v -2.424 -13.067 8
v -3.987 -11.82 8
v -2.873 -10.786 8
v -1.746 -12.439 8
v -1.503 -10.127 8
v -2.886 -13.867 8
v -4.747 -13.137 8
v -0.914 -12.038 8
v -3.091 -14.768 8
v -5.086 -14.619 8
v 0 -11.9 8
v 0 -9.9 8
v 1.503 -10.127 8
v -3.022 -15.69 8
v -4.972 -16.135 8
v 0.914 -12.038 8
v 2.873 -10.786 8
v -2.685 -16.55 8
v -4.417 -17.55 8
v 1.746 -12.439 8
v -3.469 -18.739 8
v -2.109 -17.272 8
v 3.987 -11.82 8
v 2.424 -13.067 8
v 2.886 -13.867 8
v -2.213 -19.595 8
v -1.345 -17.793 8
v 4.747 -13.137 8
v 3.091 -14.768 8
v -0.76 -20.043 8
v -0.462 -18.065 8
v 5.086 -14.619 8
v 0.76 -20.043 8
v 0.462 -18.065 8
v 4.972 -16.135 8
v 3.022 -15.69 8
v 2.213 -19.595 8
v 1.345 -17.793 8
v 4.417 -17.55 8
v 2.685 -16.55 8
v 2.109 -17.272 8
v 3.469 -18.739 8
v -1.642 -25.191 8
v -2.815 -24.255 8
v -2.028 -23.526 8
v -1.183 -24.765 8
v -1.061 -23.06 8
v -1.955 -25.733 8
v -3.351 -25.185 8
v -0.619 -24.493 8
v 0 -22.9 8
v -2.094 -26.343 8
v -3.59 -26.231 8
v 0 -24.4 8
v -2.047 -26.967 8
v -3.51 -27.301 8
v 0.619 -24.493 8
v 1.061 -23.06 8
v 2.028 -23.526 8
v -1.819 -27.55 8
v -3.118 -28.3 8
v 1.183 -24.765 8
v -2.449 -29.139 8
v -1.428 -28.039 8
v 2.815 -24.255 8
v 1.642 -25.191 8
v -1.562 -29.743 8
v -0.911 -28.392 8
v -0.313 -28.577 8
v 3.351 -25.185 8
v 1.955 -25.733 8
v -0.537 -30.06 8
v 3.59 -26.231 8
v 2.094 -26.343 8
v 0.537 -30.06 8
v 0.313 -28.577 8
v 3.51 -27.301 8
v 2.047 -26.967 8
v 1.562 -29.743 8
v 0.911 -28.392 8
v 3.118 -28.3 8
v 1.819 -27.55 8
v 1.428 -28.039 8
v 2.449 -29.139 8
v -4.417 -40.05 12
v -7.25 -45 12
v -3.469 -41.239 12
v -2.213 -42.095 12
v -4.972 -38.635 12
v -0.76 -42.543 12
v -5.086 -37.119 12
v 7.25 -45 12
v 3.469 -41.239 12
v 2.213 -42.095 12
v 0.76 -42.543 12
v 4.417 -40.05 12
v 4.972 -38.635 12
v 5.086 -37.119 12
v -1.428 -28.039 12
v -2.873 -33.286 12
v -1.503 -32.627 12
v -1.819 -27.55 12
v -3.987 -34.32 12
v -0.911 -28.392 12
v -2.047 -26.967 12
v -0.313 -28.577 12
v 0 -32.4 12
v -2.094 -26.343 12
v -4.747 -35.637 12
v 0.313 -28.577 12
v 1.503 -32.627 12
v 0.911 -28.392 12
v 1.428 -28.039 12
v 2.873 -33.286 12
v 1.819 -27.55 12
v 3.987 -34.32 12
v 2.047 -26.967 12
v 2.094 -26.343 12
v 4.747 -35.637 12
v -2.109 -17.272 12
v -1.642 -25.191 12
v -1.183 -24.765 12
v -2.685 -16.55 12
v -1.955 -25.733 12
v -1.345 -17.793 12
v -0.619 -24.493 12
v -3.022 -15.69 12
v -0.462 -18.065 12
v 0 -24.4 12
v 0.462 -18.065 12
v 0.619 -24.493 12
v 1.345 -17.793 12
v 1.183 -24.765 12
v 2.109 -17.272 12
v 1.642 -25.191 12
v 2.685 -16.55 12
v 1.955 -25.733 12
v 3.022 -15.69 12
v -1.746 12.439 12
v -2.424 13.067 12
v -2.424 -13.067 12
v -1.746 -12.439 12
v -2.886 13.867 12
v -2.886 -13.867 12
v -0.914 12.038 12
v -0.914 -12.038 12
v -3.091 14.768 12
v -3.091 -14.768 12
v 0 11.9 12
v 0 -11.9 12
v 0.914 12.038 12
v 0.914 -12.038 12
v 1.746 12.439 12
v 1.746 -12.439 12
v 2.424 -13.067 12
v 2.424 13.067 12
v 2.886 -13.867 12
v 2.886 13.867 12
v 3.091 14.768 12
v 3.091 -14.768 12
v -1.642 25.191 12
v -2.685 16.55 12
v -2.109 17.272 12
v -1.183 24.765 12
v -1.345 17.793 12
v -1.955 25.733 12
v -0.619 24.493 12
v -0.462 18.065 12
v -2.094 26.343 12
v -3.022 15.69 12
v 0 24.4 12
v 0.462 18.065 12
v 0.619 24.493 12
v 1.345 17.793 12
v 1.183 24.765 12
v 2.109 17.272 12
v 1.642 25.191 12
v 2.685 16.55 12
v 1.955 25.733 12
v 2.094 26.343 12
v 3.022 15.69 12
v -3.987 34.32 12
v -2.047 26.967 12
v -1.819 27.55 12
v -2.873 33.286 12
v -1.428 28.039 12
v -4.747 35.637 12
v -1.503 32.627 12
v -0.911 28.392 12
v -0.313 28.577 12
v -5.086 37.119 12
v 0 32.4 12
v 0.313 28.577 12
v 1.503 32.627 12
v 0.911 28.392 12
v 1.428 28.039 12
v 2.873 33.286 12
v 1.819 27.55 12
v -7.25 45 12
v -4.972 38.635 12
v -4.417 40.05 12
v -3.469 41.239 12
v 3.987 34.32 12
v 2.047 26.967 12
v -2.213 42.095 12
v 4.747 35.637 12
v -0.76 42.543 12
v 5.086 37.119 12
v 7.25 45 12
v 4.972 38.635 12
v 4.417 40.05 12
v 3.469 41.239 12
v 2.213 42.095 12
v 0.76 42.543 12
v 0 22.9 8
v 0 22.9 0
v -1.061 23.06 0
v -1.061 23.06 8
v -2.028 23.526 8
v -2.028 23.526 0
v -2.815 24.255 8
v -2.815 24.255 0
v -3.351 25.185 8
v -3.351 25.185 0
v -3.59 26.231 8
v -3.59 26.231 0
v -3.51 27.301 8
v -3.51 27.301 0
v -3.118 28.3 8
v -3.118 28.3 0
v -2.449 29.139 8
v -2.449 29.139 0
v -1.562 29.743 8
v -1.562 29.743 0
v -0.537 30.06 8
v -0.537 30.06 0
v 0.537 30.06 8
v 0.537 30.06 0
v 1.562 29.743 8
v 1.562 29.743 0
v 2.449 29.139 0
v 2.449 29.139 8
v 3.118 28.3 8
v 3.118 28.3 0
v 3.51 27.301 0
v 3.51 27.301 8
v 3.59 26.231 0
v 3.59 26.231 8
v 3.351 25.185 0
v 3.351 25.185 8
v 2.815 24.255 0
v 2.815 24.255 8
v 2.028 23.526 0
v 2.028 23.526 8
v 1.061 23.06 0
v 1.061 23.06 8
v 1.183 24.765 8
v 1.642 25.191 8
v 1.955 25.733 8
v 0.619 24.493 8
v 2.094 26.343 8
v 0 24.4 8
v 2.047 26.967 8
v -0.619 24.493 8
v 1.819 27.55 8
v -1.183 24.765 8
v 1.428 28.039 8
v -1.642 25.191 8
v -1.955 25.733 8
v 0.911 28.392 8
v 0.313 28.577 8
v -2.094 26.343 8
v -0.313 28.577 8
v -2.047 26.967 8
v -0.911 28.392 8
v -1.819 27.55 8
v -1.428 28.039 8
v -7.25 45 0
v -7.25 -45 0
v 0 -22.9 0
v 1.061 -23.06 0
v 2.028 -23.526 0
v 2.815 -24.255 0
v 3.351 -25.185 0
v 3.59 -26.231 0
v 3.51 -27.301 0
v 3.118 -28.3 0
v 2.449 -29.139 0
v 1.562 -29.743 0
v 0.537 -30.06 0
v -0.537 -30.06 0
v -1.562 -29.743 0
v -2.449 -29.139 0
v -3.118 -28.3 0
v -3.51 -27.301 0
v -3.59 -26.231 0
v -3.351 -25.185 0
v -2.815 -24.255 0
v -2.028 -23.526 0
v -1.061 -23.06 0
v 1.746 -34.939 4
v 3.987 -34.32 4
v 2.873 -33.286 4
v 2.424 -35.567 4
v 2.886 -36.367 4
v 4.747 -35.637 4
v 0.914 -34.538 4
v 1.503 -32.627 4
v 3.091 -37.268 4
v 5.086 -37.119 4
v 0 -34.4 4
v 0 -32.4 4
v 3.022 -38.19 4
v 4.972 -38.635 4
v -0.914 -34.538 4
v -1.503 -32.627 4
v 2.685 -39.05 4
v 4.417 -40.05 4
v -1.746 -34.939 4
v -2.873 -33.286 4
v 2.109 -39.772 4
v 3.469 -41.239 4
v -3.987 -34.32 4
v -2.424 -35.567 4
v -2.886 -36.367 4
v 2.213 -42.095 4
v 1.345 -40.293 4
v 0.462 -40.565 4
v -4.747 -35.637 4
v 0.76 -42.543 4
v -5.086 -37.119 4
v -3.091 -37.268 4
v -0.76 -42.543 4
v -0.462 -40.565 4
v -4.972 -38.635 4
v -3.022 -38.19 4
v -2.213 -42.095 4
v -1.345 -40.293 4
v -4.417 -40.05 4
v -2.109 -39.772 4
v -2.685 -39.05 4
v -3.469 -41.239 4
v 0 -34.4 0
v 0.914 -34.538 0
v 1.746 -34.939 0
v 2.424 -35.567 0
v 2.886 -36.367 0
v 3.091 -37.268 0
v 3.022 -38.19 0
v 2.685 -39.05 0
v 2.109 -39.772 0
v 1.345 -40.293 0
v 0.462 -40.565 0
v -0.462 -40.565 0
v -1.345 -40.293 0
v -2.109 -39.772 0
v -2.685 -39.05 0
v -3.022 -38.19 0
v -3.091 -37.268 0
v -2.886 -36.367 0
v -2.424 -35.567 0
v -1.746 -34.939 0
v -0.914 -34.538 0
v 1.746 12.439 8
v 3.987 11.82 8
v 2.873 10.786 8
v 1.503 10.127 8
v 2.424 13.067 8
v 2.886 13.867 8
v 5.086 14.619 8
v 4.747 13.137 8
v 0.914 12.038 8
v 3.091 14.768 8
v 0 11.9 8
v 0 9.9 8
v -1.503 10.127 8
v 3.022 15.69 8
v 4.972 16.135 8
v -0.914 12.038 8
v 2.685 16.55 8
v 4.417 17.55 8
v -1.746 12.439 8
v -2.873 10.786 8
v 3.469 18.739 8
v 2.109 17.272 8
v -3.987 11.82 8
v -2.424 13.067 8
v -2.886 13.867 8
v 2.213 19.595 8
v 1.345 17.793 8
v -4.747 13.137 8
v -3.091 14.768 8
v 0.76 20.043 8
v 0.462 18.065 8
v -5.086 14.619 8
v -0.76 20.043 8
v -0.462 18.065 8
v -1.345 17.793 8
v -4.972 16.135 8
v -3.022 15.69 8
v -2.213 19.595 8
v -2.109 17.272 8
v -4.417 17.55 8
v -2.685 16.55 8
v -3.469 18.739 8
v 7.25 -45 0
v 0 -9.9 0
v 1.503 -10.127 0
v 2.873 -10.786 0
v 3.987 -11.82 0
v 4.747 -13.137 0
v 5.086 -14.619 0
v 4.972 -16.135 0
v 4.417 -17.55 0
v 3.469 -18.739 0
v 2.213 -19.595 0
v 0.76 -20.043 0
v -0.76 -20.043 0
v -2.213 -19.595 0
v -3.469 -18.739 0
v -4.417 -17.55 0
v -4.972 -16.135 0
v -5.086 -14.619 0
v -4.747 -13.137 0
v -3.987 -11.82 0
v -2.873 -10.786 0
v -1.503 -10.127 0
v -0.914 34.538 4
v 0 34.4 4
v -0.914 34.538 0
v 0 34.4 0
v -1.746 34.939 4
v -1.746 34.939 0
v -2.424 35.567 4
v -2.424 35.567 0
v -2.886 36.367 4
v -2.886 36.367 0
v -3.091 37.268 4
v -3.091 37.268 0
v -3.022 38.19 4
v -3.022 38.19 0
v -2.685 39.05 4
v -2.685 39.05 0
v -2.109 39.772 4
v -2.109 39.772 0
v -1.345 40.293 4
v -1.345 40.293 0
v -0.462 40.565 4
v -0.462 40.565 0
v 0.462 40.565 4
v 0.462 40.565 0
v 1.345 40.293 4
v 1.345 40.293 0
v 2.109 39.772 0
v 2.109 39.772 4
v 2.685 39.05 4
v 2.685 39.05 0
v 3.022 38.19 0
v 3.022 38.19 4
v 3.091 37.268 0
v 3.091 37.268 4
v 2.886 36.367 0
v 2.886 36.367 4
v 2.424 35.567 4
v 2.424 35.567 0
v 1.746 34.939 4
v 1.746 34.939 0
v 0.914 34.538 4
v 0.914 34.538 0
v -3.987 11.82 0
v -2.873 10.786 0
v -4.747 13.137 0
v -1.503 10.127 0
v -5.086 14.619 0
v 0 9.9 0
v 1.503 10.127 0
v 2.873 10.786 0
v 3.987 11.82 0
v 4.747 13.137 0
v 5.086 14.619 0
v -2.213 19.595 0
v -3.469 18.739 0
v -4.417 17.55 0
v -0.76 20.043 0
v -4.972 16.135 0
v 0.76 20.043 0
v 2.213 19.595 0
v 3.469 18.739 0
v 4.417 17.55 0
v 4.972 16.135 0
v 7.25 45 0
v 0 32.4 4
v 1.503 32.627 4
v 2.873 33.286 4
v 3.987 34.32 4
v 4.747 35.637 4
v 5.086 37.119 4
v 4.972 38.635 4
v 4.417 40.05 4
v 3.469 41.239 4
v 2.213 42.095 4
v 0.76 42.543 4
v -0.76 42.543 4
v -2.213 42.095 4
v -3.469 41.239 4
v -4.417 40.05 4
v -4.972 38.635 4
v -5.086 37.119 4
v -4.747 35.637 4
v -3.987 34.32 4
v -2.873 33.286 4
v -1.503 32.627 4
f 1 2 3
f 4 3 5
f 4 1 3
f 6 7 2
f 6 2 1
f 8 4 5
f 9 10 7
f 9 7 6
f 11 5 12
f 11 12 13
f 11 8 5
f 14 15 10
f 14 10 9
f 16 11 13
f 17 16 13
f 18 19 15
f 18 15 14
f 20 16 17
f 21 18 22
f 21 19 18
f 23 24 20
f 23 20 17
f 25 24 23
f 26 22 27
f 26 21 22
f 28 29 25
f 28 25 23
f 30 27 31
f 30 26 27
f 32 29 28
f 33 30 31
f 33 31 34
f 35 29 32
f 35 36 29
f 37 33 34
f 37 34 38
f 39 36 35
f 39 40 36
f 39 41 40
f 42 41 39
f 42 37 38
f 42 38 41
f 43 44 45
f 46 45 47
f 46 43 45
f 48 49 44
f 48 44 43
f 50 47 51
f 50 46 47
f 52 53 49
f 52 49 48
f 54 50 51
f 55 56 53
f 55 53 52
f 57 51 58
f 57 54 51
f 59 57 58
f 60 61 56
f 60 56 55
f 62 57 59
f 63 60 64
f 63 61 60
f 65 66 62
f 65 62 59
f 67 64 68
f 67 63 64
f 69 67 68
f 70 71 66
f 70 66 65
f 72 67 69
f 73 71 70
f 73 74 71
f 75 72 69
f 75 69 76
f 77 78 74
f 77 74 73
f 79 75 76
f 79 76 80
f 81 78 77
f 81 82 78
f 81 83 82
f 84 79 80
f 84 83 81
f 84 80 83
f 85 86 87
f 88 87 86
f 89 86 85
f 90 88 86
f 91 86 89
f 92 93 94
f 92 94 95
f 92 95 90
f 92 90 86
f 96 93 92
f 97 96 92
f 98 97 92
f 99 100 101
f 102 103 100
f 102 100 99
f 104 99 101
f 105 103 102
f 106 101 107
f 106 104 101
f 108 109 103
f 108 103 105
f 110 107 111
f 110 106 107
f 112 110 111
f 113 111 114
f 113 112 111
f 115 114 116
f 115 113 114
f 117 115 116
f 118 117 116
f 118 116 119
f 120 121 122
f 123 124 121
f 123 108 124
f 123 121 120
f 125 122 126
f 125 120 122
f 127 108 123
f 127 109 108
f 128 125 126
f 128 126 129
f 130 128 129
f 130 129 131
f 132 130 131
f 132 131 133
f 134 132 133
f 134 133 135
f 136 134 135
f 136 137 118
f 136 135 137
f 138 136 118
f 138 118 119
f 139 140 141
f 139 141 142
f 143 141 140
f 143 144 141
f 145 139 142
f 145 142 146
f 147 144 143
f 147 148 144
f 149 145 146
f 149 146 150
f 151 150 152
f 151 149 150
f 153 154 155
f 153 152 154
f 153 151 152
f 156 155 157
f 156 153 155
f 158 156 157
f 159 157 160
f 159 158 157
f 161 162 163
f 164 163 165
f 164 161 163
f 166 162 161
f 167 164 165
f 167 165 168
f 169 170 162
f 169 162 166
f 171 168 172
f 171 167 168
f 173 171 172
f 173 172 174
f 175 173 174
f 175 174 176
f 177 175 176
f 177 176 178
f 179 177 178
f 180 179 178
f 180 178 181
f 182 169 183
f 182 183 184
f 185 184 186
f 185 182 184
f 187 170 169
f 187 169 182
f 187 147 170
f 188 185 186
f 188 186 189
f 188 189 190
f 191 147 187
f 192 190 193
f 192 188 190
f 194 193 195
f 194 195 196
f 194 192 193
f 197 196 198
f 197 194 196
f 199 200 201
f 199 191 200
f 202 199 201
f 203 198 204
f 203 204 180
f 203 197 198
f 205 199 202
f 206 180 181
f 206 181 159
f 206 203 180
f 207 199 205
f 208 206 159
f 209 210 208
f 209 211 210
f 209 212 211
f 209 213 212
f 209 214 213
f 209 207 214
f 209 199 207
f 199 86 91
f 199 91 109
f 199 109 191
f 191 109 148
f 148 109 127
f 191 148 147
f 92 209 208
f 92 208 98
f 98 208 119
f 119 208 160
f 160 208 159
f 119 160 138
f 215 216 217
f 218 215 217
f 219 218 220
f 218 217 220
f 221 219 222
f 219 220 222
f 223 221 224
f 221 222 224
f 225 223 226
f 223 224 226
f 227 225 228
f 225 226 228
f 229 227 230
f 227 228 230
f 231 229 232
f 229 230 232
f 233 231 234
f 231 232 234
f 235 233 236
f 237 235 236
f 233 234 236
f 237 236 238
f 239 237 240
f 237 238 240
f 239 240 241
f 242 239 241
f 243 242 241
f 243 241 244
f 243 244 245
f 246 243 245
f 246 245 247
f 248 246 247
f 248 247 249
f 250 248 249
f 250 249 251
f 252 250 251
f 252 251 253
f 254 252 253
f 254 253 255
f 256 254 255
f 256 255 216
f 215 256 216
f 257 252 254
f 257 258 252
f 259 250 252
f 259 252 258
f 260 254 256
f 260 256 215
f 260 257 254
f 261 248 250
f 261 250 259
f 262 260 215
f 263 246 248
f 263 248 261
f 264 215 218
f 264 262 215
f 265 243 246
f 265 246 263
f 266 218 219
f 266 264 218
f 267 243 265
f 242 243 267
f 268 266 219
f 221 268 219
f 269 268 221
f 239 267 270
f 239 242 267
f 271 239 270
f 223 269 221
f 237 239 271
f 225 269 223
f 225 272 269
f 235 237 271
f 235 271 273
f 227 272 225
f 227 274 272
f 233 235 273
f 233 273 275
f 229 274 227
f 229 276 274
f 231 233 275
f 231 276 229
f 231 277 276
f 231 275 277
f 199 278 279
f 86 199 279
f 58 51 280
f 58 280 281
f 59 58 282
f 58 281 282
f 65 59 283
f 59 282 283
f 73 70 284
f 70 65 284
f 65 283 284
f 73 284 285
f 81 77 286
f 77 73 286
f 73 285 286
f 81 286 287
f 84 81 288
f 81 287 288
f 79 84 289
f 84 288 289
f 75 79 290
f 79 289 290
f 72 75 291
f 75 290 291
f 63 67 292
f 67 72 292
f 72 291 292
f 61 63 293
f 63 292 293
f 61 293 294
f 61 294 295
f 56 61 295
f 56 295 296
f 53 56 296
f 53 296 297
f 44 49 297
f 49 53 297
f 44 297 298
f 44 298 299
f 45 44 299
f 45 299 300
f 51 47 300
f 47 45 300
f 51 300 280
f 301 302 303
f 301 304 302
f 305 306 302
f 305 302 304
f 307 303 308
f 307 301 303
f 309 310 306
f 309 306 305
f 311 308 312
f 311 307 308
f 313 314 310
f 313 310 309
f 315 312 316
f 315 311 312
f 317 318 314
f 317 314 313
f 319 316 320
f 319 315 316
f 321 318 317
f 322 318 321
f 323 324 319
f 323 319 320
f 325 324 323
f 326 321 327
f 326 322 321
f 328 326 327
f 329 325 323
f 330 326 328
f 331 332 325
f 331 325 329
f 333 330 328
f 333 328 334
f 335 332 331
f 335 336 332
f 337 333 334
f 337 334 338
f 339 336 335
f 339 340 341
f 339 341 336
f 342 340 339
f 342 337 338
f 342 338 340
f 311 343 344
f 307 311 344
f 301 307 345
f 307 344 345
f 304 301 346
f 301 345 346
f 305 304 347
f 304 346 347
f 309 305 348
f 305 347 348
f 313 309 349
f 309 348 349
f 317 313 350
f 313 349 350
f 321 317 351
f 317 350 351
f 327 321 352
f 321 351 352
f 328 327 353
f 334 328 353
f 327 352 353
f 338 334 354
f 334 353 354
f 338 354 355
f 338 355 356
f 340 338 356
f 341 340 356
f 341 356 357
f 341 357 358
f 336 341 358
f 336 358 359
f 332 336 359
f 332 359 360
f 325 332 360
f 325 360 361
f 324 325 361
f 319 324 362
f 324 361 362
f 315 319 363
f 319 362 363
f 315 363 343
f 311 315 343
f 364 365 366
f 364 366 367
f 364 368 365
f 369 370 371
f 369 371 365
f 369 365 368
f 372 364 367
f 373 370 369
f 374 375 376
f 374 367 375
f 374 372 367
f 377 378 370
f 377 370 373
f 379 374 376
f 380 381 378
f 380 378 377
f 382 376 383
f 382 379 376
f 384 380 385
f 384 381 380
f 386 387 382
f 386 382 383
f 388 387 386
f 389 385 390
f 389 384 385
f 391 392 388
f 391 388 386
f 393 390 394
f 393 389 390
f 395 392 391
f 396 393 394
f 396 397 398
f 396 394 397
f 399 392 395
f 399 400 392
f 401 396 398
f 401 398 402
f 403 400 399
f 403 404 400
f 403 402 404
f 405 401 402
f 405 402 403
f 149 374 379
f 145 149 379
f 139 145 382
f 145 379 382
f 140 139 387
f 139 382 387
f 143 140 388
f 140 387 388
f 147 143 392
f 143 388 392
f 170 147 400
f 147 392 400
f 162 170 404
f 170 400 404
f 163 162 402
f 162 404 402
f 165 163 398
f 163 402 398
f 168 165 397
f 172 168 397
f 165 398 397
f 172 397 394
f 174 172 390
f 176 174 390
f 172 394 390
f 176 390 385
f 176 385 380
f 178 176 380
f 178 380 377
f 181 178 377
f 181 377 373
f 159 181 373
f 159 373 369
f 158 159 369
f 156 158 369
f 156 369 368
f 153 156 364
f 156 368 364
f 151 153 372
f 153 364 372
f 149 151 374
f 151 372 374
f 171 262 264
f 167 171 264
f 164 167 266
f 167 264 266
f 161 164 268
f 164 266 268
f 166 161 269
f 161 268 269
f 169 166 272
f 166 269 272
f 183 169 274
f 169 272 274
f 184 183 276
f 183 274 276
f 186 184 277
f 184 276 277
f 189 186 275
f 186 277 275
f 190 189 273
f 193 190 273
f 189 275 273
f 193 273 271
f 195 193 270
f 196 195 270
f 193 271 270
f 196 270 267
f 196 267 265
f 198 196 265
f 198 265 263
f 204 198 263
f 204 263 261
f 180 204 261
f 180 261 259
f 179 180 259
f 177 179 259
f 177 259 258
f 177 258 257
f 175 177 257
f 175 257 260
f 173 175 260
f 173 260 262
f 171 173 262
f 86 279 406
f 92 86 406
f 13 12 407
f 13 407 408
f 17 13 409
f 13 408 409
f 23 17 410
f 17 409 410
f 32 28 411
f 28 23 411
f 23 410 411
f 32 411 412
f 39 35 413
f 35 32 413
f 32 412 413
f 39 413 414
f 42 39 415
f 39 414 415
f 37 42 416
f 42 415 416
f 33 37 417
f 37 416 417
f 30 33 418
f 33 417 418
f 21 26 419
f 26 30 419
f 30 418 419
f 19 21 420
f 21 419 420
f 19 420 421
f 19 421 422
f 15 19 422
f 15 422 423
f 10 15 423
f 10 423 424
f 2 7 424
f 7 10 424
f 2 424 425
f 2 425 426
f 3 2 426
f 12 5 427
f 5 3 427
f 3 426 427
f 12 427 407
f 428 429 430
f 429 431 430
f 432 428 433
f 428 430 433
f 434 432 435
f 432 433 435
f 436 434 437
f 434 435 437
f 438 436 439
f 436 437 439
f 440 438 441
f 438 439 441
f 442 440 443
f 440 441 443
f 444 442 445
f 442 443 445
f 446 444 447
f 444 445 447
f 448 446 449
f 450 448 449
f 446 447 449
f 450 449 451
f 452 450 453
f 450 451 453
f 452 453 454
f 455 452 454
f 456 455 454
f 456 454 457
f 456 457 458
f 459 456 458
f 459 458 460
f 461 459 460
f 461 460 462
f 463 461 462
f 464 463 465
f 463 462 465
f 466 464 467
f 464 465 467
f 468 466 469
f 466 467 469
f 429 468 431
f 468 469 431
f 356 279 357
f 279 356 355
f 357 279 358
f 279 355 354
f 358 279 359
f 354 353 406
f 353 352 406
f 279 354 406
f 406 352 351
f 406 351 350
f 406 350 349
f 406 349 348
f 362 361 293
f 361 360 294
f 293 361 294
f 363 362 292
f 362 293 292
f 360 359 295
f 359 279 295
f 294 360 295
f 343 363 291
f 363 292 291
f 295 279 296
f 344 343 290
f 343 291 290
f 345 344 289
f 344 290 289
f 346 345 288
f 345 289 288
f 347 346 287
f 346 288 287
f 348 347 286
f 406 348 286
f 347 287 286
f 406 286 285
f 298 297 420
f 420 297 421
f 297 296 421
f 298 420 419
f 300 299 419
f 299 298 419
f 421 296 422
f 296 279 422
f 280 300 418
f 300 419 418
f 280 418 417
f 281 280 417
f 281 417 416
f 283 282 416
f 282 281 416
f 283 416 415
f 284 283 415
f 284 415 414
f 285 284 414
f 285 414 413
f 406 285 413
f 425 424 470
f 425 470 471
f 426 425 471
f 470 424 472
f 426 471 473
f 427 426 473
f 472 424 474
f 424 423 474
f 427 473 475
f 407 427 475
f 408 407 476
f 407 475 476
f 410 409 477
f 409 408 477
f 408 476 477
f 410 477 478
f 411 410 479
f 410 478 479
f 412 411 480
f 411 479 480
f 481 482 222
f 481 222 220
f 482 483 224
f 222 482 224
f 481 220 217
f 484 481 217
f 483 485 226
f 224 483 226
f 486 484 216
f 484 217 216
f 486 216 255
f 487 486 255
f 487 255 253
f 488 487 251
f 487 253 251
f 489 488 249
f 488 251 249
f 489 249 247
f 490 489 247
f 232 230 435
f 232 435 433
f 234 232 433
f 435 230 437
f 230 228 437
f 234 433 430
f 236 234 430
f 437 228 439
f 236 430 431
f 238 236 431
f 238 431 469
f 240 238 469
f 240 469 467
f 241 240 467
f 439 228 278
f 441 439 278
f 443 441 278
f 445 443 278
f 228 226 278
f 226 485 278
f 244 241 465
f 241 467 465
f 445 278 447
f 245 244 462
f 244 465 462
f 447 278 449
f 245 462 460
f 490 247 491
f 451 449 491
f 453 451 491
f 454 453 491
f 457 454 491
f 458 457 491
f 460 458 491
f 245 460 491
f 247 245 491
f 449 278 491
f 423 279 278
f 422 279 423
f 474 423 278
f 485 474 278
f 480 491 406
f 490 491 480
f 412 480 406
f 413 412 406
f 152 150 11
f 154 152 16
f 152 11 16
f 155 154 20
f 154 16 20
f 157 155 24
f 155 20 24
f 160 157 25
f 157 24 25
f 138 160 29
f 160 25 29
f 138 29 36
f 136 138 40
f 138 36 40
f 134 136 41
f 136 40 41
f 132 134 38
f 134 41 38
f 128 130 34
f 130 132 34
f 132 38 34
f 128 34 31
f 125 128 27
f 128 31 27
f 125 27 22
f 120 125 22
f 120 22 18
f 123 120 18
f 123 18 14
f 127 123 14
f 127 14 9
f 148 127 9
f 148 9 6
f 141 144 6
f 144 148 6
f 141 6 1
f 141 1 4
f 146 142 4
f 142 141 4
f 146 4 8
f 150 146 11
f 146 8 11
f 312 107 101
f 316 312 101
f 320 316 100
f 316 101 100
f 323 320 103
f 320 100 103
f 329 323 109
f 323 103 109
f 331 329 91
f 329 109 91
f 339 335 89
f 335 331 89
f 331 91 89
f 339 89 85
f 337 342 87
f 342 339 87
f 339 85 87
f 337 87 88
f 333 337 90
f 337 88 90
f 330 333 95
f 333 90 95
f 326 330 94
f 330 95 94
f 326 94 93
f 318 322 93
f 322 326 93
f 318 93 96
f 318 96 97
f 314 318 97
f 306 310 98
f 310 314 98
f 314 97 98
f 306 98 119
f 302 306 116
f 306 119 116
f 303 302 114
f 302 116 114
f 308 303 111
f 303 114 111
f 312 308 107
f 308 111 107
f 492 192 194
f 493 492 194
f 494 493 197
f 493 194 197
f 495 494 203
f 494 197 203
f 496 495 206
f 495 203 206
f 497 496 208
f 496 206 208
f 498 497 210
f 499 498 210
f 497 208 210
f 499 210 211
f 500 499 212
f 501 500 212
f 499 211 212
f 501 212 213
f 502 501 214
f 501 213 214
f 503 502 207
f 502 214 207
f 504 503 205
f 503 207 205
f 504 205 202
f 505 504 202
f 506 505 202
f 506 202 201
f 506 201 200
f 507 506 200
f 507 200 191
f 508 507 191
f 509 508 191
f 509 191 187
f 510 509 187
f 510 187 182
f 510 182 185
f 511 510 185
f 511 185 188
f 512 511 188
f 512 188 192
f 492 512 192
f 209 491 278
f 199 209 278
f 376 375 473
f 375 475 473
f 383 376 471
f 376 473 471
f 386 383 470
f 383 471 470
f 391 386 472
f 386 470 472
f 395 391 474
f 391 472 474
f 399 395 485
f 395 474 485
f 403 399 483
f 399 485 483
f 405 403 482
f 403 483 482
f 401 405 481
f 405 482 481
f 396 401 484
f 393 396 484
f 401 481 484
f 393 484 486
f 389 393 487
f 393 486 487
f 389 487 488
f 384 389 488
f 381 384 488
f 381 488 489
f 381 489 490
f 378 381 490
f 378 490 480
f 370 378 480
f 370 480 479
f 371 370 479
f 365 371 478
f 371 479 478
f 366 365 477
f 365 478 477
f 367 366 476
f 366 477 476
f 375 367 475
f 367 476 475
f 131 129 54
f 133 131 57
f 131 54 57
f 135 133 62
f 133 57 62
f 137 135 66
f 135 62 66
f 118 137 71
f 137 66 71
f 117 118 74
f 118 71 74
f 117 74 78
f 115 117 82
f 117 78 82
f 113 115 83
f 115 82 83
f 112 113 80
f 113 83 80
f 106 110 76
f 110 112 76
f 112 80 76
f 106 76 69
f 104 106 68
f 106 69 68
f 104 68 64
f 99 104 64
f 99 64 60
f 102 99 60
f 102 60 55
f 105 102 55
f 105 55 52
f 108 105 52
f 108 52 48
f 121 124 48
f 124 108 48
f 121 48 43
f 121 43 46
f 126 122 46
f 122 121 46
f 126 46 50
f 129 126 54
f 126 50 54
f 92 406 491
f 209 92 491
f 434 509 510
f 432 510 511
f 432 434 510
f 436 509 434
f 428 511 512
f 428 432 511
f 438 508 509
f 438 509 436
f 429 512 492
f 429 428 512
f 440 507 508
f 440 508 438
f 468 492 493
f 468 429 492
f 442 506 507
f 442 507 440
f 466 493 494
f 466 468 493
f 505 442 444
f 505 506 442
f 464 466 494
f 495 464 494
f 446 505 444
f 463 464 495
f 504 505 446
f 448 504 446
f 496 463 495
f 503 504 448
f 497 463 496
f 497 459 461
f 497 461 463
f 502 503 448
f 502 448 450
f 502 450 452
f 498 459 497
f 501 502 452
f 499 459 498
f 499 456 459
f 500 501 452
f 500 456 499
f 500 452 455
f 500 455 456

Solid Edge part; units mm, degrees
sketch "Sketch1" plane through (0, 0, 0) normal (0, 0, 1) x (1, 0, 0)
  line L0 (-7.25, -45) -> (7.25, -45)
  line L1 (7.25, -45) -> (7.25, 45)
  line L2 (7.25, 45) -> (-7.25, 45)
  line L3 (-7.25, 45) -> (-7.25, -45)
  dimension "D1" = 14.5
  dimension "D2" = 90
extrude "Protrusion1" add sketch "Sketch1" along normal blind 12
sketch "Sketch2" plane through (0, 0, 0) normal (0, 0, -1) x (0, -1, 0)
  circle A0 centre (-26.5, 0) radius 2.1
  circle A1 centre (-37.5, 0) radius 3.1
  circle A2 centre (-15, 0) radius 3.1
  dimension "D1" = 15
  dimension "D2" = 26.5
  dimension "D3" = 37.5
extrude "Cutout1" cut sketch "Sketch2" against normal up to next
sketch "Sketch3" plane through (0, 0, 0) normal (0, 0, -1) x (0, -1, 0)
  circle A0 centre (-15, 0) radius 5.1
  circle A1 centre (-26.5, 0) radius 3.6
extrude "ExtrudedCutout_2" cut sketch "Sketch3" against normal blind 8
sketch "Sketch4" plane through (0, 0, 12) normal (0, 0, 1) x (0, -1, 0)
  circle A0 centre (-37.5, 0) radius 5.1
extrude "ExtrudedCutout_3" cut sketch "Sketch4" against normal blind 8
mirror "Mirror1" about plane through (0, 0, 0) normal (0, 1, 0) of "Cutout1", "ExtrudedCutout_2", "ExtrudedCutout_3"
